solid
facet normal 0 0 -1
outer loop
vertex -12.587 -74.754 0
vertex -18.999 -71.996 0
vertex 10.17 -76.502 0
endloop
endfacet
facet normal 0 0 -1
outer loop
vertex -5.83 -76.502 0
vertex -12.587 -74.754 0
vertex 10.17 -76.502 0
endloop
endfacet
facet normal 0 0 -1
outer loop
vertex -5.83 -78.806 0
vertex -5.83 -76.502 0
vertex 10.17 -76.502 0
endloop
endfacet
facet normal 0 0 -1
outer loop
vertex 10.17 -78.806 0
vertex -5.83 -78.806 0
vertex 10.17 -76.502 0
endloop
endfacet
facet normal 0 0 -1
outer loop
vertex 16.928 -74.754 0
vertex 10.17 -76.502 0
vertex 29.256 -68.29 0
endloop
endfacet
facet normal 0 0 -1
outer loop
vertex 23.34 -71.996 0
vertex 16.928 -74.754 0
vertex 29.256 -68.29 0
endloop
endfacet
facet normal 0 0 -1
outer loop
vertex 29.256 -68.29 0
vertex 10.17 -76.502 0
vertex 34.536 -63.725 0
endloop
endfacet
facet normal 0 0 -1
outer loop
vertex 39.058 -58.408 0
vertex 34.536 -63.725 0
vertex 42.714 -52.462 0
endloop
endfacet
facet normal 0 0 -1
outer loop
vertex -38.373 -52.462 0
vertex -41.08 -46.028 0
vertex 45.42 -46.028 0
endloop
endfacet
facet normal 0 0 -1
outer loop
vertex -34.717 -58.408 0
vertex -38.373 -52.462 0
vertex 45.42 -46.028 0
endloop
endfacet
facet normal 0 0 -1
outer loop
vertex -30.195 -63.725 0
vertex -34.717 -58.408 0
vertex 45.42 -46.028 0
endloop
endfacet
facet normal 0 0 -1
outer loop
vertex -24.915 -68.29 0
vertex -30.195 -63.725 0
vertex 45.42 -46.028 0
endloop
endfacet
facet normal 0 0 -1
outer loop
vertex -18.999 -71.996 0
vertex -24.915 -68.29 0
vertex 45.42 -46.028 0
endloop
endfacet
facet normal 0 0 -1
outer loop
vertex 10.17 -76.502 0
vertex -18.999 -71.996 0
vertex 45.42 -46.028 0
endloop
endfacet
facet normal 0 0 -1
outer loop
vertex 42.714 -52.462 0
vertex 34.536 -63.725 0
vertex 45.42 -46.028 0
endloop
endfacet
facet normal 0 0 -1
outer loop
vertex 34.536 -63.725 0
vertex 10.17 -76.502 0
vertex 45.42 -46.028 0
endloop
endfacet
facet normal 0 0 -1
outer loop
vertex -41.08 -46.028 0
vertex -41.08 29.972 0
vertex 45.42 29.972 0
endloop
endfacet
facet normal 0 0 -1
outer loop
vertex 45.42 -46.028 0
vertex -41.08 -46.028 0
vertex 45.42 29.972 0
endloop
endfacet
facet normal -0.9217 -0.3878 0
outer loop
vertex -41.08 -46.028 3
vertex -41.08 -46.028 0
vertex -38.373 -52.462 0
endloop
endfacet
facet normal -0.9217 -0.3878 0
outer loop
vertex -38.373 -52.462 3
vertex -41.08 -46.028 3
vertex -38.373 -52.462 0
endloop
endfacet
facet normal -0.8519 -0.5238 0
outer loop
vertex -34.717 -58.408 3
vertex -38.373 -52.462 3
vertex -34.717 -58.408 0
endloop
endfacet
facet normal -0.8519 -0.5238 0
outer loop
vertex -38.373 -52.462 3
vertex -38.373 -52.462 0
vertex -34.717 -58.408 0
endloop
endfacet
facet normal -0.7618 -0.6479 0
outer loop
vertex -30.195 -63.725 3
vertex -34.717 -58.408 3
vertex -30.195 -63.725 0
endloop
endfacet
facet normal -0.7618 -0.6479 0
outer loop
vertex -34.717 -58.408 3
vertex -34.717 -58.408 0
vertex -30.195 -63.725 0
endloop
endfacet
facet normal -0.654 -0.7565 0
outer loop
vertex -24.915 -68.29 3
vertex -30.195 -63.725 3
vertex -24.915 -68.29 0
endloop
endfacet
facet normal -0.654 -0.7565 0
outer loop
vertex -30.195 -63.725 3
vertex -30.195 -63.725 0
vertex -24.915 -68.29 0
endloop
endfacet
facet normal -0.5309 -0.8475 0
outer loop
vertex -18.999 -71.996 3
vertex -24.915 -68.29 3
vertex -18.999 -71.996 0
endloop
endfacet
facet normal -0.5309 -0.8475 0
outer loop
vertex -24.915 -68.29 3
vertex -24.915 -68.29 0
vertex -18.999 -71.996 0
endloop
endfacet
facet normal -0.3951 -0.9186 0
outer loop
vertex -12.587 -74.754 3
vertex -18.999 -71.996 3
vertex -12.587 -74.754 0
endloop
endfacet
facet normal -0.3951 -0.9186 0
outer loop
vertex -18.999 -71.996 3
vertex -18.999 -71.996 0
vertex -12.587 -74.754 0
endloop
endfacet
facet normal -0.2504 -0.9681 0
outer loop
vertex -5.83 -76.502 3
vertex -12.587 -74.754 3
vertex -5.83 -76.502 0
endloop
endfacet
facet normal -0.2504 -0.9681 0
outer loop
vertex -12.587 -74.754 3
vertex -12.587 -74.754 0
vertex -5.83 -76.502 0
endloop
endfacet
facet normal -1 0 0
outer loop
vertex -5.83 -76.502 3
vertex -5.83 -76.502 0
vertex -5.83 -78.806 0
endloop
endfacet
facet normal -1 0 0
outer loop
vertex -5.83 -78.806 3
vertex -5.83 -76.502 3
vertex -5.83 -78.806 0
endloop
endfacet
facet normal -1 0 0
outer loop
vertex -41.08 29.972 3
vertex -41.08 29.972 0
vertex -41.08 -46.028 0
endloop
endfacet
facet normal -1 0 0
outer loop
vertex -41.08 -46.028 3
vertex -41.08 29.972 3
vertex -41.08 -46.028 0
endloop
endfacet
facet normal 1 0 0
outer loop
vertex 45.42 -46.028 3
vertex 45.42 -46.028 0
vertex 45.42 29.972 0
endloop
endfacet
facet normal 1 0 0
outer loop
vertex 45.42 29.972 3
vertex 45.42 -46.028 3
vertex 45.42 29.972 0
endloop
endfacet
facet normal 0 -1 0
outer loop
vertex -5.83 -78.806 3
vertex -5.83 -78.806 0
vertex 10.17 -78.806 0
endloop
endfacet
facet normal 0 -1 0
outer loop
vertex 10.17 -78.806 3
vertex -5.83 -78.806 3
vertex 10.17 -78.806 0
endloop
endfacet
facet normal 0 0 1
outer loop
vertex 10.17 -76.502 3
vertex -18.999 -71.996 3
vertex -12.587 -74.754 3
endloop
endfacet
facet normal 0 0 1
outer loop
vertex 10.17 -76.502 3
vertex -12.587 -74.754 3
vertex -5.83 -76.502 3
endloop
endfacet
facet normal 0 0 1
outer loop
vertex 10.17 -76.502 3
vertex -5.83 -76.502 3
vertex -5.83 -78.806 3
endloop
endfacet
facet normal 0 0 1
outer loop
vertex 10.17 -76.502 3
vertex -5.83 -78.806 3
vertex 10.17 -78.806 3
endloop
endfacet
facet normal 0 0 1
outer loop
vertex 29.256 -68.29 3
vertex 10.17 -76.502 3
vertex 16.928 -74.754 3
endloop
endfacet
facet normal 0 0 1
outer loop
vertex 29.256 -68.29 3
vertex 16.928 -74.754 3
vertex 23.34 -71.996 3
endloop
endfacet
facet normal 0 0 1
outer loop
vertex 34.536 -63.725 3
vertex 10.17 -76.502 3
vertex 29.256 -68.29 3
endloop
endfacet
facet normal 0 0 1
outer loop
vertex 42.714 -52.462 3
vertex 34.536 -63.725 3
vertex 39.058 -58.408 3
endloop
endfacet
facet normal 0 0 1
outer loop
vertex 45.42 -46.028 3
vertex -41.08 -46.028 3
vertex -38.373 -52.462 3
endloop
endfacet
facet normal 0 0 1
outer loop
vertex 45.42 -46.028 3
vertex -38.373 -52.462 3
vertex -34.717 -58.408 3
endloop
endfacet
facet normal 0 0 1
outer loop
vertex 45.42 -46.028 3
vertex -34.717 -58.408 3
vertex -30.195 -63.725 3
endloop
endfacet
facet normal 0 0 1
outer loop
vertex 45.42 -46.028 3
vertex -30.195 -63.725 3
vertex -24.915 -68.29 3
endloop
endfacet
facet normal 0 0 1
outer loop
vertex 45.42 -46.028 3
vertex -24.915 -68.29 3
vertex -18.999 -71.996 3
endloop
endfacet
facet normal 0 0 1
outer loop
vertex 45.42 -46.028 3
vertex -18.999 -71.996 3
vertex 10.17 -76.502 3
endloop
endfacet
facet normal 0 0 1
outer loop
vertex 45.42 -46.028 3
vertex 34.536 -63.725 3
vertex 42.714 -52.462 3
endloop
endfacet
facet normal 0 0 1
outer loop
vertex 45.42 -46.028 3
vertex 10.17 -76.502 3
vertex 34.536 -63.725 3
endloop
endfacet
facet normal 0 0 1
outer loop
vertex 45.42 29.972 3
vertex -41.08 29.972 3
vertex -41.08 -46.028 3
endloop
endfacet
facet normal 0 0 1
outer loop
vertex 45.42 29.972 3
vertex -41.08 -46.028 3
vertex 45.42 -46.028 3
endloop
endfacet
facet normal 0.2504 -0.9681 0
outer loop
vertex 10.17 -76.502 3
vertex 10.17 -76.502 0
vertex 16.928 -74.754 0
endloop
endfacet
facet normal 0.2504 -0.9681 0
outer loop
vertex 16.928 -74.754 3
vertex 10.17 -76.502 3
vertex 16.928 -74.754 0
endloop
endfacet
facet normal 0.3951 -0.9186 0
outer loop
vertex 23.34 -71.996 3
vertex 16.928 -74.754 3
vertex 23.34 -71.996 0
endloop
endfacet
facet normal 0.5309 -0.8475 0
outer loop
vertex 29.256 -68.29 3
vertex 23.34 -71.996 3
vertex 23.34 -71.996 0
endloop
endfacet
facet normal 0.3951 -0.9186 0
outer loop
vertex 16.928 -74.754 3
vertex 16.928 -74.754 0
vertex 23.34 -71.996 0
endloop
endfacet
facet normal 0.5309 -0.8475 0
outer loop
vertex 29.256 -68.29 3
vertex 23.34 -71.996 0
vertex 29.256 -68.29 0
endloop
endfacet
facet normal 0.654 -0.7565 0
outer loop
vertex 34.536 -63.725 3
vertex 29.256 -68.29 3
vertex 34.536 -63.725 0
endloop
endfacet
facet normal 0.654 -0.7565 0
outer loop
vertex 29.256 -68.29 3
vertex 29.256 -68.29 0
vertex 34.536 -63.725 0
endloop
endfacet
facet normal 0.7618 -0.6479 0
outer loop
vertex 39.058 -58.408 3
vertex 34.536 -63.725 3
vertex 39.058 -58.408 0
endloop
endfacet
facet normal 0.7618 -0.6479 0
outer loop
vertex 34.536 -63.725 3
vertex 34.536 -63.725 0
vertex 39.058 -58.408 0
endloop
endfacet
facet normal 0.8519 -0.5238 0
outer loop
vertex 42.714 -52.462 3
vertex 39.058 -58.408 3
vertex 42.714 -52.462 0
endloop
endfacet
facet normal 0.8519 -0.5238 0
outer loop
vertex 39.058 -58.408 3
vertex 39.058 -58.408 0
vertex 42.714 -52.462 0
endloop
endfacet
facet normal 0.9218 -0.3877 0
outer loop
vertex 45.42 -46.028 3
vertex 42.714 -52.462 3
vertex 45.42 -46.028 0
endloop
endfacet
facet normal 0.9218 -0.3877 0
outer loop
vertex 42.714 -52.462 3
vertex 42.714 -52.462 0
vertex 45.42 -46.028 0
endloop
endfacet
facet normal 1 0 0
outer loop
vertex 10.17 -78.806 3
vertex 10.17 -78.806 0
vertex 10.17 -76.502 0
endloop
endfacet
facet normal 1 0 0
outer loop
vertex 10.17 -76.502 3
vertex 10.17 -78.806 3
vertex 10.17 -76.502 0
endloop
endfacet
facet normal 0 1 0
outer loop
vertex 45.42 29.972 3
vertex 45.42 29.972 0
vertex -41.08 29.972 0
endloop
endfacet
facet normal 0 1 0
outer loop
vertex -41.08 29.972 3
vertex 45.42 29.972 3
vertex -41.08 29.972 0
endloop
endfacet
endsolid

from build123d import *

# Parameters (mm, degrees)
F1_DEPTH = 3


with BuildPart() as f1:
    # F0 (on Top) → F1 (new body)
    with BuildSketch(Plane.XY):
        with BuildLine():
            Line((2.170431, -46.027672), (-41.079569, -46.027672))
            ThreePointArc((-41.079569, -46.027672), (-27.642472, -66.108974), (-5.829569, -76.501831))
            ThreePointArc((-5.829569, -76.501831), (-1.845179, -77.032088), (2.170431, -77.209299))
            Line((2.170431, -77.209299), (2.170431, -46.027672))
        make_face()
        with BuildLine():
            ThreePointArc((10.170431, -76.501831), (31.983335, -66.108974), (45.420431, -46.027672))
            Line((45.420431, -46.027672), (2.170431, -46.027672))
            Line((2.170431, -46.027672), (2.170431, -77.209299))
            ThreePointArc((2.170431, -77.209299), (6.186042, -77.032088), (10.170431, -76.501831))
        make_face()
        Polygon((45.420431, 29.972328), (-41.079569, 29.972328), (-41.079569, -46.027672), (2.170431, -46.027672), (45.420431, -46.027672), align=None)
        with BuildLine():
            ThreePointArc((2.170431, -77.209299), (-1.845179, -77.032088), (-5.829569, -76.501831))
            Line((-5.829569, -76.501831), (-5.829569, -78.805961))
            Line((-5.829569, -78.805961), (2.170431, -78.805961))
            Line((2.170431, -78.805961), (10.170431, -78.805961))
            Line((10.170431, -78.805961), (10.170431, -76.501831))
            ThreePointArc((10.170431, -76.501831), (6.186042, -77.032088), (2.170431, -77.209299))
        make_face()
    extrude(amount=F1_DEPTH)


solid = f1.part
